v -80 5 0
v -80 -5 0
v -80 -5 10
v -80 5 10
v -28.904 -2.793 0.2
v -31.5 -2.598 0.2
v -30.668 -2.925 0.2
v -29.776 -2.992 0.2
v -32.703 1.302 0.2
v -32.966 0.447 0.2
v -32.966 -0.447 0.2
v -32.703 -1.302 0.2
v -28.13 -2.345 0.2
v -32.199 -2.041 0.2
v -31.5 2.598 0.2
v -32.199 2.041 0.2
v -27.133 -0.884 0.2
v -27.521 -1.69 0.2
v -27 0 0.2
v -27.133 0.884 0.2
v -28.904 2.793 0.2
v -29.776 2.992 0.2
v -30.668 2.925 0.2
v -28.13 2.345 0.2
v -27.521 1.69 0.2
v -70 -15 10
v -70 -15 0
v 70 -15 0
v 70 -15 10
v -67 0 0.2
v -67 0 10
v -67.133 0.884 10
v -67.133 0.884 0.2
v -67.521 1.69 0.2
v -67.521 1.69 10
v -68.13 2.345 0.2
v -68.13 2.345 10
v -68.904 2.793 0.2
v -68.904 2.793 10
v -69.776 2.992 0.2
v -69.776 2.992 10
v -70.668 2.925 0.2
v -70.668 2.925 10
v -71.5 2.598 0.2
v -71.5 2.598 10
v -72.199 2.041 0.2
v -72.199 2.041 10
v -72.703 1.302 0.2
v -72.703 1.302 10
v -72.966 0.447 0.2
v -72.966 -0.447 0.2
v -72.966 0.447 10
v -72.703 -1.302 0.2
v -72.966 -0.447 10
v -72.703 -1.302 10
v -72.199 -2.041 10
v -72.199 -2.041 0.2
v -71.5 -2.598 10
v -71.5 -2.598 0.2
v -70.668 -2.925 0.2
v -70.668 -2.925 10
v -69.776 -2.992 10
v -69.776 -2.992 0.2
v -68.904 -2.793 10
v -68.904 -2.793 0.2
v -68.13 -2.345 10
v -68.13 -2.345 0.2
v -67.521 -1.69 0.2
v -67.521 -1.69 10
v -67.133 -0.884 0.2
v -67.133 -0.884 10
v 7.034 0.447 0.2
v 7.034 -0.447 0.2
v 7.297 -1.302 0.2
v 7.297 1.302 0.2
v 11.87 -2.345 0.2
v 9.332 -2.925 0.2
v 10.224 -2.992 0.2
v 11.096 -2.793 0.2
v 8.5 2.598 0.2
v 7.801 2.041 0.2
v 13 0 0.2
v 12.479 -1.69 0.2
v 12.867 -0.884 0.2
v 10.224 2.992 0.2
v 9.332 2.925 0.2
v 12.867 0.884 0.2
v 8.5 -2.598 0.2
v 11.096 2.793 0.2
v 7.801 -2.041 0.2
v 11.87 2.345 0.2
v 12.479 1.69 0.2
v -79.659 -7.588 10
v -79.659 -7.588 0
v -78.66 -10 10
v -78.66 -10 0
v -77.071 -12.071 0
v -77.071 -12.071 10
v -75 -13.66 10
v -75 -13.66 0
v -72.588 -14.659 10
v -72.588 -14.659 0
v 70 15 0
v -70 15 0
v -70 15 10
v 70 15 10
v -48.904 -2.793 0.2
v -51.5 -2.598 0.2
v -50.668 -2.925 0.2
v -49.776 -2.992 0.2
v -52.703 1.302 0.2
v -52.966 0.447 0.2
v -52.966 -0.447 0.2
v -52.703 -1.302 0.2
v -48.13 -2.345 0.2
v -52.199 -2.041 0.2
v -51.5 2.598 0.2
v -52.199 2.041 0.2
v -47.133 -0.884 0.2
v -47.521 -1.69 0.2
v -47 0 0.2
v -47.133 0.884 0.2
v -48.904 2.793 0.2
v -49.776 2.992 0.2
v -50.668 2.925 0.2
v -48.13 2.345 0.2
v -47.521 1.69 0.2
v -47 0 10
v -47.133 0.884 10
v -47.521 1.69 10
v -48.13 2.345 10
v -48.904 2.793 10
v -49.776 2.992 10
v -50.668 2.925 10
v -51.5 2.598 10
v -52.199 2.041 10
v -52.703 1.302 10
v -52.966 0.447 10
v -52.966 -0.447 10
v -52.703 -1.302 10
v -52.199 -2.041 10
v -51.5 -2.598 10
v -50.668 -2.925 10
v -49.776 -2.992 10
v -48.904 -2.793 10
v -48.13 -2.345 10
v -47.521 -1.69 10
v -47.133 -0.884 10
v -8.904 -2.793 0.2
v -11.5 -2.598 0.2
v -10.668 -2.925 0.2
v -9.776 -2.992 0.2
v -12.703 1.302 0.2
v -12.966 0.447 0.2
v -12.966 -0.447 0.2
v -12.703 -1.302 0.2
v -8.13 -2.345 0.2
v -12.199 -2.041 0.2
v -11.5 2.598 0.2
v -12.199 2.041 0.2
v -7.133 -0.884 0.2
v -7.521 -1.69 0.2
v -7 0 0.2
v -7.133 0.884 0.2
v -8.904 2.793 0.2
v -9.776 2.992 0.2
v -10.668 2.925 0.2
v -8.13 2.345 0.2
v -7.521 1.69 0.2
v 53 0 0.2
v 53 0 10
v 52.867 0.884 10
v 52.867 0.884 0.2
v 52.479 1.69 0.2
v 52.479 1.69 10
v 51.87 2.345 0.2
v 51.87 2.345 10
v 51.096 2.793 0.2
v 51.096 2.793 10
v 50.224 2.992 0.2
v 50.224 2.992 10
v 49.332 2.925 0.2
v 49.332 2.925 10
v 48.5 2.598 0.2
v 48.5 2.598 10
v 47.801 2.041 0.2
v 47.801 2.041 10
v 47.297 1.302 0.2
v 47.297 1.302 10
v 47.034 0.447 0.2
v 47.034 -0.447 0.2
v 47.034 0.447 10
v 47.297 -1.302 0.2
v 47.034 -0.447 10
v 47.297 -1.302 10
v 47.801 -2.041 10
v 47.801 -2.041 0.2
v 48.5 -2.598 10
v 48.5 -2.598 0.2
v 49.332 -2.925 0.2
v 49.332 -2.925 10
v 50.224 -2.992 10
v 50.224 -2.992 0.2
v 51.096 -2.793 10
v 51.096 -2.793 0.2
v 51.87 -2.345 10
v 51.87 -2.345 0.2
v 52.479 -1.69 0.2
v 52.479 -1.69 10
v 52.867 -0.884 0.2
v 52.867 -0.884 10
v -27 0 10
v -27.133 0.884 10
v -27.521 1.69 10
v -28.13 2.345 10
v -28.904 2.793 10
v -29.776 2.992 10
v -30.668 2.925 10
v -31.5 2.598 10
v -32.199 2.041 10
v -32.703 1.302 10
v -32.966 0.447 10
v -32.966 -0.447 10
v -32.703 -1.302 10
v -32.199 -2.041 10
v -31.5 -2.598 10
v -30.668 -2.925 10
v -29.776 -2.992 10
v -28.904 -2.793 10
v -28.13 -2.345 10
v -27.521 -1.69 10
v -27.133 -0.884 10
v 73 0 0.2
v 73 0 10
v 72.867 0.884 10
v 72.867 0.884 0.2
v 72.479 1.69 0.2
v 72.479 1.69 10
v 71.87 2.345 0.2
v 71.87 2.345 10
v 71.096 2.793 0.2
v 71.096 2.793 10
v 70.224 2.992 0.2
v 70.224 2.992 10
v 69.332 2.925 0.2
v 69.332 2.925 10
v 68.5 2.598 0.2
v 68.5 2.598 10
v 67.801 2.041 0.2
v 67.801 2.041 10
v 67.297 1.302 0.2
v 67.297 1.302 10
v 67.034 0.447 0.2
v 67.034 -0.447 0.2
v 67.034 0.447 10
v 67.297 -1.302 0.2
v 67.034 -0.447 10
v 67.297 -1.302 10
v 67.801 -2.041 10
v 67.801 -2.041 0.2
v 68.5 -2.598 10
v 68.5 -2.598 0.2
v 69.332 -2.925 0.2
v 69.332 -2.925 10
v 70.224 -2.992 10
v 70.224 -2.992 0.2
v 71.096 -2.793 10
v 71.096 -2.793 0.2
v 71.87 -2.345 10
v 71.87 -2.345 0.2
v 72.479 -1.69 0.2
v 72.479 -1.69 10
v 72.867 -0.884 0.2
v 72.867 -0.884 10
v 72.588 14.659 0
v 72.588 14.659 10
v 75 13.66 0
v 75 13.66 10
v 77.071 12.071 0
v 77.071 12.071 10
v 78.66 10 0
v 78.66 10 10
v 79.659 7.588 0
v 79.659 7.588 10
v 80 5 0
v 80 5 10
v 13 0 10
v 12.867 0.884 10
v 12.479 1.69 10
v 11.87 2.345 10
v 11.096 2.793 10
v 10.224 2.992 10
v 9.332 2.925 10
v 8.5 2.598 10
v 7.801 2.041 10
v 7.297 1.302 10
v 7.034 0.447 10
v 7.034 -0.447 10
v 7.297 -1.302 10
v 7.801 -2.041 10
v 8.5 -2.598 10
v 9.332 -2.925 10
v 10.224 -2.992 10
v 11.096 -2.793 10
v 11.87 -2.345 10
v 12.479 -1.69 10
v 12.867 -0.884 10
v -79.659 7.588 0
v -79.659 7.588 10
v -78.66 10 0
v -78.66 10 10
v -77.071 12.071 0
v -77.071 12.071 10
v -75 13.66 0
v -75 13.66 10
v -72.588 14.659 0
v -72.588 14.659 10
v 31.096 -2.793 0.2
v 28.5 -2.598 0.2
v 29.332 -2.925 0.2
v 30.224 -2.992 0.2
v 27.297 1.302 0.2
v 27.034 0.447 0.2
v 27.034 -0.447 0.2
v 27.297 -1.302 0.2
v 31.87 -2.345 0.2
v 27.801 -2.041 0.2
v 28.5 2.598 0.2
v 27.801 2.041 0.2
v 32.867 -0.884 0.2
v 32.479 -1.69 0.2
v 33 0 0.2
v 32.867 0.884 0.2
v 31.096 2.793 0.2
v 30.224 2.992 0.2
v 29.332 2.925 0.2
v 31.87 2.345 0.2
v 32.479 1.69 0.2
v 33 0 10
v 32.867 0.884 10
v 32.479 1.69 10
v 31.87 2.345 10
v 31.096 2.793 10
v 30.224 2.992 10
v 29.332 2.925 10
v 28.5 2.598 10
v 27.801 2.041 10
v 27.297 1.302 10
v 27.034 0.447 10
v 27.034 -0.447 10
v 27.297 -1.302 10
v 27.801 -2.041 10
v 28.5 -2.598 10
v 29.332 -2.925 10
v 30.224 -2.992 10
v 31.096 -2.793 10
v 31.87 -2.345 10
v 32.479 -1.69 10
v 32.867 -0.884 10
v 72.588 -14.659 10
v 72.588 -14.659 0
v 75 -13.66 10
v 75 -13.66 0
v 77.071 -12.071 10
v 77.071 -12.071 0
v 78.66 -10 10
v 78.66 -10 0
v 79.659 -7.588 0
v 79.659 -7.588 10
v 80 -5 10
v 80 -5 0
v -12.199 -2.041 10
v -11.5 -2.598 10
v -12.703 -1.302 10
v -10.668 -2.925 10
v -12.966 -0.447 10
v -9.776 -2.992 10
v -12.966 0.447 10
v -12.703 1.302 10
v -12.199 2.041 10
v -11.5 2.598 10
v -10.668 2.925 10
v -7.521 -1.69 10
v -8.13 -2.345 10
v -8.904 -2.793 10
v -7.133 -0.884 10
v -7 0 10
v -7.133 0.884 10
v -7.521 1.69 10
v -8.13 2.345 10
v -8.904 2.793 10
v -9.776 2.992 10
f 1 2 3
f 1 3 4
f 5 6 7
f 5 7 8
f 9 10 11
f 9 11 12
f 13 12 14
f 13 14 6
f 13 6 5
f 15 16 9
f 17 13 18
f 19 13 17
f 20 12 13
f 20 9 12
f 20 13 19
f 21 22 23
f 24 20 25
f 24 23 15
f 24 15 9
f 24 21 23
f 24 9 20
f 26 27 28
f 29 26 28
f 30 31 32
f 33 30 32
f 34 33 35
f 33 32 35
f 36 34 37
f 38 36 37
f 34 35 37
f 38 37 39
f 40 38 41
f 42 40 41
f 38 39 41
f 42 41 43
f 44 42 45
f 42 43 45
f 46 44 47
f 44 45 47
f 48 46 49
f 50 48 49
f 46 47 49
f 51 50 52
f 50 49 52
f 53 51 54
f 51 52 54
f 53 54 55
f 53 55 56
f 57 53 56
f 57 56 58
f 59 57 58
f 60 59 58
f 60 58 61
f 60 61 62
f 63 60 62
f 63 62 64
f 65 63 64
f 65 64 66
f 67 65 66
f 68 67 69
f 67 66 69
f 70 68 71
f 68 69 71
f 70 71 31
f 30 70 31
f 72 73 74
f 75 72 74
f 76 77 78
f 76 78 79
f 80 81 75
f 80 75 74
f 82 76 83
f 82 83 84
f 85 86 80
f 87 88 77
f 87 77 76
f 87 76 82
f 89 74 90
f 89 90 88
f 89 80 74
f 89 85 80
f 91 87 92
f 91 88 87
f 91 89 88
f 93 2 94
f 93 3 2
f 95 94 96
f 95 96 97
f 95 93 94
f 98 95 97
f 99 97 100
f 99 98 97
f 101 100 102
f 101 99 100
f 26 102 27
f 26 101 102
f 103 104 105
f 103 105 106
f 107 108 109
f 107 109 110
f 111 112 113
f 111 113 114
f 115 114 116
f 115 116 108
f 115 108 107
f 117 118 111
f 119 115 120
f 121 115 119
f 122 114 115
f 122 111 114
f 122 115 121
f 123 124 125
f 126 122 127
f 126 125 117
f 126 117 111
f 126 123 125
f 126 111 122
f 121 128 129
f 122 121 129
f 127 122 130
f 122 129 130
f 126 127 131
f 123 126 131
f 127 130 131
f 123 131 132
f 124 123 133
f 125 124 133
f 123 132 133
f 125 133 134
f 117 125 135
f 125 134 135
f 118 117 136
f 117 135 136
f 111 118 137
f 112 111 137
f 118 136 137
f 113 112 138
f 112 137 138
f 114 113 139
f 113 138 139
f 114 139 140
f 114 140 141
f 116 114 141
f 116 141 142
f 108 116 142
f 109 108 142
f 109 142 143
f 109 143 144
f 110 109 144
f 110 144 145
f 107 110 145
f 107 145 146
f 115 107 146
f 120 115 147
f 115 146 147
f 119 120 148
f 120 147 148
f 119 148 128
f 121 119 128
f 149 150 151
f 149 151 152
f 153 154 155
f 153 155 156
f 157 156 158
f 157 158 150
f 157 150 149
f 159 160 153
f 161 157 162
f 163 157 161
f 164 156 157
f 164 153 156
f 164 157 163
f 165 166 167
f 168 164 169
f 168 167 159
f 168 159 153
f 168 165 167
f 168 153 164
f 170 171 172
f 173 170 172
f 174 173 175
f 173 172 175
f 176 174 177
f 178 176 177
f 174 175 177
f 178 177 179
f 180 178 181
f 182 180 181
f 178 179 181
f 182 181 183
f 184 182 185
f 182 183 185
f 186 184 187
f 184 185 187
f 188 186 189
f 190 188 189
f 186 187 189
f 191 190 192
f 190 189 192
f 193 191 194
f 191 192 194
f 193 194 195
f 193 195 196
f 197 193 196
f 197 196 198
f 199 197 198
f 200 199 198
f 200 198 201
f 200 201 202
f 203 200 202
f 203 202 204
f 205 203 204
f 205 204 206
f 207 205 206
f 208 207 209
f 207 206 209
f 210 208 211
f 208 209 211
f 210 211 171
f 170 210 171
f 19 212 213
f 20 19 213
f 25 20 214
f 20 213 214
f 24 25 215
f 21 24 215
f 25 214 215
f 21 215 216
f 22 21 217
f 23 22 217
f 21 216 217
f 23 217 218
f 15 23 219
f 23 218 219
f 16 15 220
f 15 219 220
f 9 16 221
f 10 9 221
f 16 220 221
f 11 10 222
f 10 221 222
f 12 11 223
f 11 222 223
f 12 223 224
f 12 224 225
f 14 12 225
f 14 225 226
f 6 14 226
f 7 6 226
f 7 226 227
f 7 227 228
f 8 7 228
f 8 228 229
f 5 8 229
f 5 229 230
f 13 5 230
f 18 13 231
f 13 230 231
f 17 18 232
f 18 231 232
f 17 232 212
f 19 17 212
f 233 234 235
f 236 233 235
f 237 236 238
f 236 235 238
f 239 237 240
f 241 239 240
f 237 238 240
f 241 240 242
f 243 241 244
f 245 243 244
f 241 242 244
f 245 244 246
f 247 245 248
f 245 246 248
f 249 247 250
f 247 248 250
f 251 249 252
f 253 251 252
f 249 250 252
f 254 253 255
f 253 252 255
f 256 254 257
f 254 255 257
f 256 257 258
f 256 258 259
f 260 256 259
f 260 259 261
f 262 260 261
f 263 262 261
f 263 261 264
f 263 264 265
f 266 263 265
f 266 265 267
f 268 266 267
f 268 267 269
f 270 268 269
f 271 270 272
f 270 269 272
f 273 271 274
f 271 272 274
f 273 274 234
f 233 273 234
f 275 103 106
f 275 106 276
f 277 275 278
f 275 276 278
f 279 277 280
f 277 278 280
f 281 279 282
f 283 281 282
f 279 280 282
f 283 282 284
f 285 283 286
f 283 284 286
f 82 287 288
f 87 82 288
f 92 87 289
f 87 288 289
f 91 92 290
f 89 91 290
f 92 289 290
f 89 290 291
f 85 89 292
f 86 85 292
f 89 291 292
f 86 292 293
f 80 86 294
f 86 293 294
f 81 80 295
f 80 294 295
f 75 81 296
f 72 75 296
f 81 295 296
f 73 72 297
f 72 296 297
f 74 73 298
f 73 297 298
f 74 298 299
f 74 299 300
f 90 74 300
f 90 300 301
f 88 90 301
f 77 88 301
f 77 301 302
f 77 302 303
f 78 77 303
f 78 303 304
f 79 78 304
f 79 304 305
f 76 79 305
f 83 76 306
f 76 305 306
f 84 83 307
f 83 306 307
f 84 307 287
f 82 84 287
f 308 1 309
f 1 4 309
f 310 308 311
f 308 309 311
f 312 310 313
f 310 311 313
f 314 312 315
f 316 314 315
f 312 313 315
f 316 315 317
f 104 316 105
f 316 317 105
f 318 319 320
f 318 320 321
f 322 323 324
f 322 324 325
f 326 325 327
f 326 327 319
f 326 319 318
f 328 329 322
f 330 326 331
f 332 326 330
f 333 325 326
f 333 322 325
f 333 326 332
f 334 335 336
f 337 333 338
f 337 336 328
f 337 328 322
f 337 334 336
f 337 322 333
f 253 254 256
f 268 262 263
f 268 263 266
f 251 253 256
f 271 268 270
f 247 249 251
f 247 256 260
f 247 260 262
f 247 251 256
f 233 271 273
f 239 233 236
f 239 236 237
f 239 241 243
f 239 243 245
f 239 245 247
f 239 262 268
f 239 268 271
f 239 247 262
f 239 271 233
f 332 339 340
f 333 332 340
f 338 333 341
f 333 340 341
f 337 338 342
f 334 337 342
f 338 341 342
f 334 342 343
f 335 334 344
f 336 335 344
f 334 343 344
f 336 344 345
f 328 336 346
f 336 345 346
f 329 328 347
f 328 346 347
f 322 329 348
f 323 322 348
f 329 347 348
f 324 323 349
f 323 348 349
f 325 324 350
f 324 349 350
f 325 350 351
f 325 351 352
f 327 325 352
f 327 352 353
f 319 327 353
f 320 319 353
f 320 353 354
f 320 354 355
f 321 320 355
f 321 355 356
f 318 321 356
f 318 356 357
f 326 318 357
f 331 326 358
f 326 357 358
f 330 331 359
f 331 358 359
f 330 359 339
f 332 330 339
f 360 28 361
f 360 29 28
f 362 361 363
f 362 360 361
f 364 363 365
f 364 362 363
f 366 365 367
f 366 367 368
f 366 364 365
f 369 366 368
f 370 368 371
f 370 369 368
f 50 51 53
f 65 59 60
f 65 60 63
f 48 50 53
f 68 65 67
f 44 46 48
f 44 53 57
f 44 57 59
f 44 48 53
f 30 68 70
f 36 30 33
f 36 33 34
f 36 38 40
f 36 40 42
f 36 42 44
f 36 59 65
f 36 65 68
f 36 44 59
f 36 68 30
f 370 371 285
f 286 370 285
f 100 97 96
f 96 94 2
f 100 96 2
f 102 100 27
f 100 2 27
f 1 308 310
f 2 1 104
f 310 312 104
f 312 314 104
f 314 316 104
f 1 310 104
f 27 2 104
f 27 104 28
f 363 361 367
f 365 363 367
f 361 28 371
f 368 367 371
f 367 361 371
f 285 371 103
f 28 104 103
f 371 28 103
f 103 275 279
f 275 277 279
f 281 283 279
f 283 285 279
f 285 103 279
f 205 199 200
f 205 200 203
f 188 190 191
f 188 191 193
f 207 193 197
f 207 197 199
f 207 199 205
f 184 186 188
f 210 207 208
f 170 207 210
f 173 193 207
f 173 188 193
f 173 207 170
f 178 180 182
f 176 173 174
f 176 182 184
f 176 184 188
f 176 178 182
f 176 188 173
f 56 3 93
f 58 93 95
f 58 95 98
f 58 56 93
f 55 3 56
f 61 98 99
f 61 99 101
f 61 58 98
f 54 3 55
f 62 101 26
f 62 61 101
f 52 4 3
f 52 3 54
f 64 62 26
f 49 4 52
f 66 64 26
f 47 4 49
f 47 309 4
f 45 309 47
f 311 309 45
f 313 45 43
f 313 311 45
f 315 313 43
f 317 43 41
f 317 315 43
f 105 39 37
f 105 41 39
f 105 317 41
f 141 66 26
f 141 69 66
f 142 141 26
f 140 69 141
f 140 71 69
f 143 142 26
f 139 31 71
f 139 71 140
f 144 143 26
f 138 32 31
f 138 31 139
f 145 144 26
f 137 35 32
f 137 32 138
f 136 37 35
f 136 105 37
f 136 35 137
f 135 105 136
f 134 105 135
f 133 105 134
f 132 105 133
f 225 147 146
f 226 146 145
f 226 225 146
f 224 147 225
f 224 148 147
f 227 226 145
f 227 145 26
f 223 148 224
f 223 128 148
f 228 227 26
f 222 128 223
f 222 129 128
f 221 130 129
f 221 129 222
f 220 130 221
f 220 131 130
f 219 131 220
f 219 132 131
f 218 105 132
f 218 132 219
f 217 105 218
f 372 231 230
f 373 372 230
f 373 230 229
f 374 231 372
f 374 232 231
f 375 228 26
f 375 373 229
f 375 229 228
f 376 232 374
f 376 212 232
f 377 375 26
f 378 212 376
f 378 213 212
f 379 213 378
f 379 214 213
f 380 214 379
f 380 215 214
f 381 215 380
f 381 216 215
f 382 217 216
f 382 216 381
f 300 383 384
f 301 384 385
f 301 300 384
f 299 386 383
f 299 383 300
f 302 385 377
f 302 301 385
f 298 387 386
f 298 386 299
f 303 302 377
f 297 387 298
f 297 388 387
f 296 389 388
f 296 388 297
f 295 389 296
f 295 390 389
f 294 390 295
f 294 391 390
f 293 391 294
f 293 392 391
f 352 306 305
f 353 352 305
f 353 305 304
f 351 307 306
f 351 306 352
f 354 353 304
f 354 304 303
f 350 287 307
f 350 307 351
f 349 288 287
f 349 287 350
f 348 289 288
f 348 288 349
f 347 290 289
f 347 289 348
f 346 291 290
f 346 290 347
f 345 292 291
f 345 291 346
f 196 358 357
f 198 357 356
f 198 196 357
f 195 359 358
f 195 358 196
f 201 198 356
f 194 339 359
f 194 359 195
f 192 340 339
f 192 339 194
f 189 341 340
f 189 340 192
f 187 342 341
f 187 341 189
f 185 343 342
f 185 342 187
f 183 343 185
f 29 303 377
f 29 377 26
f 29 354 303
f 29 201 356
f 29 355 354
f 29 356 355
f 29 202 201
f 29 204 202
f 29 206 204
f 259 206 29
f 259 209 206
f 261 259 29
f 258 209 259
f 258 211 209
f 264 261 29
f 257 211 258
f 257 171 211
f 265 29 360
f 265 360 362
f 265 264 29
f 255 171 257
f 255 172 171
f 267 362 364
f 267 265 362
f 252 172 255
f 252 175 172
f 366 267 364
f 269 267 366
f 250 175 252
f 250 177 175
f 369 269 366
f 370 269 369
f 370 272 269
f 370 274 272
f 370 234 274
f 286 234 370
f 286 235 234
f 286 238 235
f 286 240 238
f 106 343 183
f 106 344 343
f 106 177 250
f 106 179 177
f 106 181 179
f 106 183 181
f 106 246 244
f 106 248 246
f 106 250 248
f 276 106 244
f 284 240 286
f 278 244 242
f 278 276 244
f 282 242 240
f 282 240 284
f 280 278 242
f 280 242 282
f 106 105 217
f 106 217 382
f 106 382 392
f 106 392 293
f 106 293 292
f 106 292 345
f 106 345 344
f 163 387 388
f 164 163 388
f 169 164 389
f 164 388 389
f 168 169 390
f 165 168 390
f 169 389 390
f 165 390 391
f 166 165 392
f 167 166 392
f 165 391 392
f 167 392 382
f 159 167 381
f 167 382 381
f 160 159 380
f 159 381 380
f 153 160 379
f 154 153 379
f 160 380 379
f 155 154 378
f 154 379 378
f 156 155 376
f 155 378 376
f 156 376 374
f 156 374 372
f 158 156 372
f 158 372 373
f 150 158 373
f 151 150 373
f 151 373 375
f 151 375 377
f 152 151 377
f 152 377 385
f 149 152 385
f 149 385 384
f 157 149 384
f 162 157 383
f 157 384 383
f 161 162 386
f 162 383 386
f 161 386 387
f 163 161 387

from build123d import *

# Parameters (mm, degrees)
SKETCH1_W           = 160
SKETCH1_H           = 30
BOSS_EXTRUDE1_DEPTH = 10
SKETCH2_R           = 3
CUT_EXTRUDE1_DEPTH  = 9.8
FILLET2_R           = 10


with BuildPart() as part:
    # Sketch1 → Boss-Extrude1 (new body)
    with BuildSketch(Plane.XY):
        Rectangle(SKETCH1_W, SKETCH1_H)
    extrude(amount=BOSS_EXTRUDE1_DEPTH)

    # Sketch2 → Cut-Extrude1 (cut)
    with BuildSketch(Plane.XY.offset(10)):
        with Locations((30, 0)):
            Circle(SKETCH2_R)
        with Locations((-30, 0)):
            Circle(SKETCH2_R)
        with Locations((-70, 0)):
            Circle(SKETCH2_R)
        with Locations((-50, 0)):
            Circle(SKETCH2_R)
        with Locations((50, 0)):
            Circle(SKETCH2_R)
        with Locations((70, 0)):
            Circle(SKETCH2_R)
        with Locations((-10, 0)):
            Circle(SKETCH2_R)
        with Locations((10, 0)):
            Circle(SKETCH2_R)
    extrude(amount=-CUT_EXTRUDE1_DEPTH, mode=Mode.SUBTRACT)

    # Fillet2
    fillet2_edges = [part.edges().sort_by_distance(p)[0] for p in [
        (80, -15, 5),
        (-80, -15, 5),
        (-80, 15, 5),
        (80, 15, 5),
    ]]
    fillet(fillet2_edges, radius=FILLET2_R)


solid = part.part
